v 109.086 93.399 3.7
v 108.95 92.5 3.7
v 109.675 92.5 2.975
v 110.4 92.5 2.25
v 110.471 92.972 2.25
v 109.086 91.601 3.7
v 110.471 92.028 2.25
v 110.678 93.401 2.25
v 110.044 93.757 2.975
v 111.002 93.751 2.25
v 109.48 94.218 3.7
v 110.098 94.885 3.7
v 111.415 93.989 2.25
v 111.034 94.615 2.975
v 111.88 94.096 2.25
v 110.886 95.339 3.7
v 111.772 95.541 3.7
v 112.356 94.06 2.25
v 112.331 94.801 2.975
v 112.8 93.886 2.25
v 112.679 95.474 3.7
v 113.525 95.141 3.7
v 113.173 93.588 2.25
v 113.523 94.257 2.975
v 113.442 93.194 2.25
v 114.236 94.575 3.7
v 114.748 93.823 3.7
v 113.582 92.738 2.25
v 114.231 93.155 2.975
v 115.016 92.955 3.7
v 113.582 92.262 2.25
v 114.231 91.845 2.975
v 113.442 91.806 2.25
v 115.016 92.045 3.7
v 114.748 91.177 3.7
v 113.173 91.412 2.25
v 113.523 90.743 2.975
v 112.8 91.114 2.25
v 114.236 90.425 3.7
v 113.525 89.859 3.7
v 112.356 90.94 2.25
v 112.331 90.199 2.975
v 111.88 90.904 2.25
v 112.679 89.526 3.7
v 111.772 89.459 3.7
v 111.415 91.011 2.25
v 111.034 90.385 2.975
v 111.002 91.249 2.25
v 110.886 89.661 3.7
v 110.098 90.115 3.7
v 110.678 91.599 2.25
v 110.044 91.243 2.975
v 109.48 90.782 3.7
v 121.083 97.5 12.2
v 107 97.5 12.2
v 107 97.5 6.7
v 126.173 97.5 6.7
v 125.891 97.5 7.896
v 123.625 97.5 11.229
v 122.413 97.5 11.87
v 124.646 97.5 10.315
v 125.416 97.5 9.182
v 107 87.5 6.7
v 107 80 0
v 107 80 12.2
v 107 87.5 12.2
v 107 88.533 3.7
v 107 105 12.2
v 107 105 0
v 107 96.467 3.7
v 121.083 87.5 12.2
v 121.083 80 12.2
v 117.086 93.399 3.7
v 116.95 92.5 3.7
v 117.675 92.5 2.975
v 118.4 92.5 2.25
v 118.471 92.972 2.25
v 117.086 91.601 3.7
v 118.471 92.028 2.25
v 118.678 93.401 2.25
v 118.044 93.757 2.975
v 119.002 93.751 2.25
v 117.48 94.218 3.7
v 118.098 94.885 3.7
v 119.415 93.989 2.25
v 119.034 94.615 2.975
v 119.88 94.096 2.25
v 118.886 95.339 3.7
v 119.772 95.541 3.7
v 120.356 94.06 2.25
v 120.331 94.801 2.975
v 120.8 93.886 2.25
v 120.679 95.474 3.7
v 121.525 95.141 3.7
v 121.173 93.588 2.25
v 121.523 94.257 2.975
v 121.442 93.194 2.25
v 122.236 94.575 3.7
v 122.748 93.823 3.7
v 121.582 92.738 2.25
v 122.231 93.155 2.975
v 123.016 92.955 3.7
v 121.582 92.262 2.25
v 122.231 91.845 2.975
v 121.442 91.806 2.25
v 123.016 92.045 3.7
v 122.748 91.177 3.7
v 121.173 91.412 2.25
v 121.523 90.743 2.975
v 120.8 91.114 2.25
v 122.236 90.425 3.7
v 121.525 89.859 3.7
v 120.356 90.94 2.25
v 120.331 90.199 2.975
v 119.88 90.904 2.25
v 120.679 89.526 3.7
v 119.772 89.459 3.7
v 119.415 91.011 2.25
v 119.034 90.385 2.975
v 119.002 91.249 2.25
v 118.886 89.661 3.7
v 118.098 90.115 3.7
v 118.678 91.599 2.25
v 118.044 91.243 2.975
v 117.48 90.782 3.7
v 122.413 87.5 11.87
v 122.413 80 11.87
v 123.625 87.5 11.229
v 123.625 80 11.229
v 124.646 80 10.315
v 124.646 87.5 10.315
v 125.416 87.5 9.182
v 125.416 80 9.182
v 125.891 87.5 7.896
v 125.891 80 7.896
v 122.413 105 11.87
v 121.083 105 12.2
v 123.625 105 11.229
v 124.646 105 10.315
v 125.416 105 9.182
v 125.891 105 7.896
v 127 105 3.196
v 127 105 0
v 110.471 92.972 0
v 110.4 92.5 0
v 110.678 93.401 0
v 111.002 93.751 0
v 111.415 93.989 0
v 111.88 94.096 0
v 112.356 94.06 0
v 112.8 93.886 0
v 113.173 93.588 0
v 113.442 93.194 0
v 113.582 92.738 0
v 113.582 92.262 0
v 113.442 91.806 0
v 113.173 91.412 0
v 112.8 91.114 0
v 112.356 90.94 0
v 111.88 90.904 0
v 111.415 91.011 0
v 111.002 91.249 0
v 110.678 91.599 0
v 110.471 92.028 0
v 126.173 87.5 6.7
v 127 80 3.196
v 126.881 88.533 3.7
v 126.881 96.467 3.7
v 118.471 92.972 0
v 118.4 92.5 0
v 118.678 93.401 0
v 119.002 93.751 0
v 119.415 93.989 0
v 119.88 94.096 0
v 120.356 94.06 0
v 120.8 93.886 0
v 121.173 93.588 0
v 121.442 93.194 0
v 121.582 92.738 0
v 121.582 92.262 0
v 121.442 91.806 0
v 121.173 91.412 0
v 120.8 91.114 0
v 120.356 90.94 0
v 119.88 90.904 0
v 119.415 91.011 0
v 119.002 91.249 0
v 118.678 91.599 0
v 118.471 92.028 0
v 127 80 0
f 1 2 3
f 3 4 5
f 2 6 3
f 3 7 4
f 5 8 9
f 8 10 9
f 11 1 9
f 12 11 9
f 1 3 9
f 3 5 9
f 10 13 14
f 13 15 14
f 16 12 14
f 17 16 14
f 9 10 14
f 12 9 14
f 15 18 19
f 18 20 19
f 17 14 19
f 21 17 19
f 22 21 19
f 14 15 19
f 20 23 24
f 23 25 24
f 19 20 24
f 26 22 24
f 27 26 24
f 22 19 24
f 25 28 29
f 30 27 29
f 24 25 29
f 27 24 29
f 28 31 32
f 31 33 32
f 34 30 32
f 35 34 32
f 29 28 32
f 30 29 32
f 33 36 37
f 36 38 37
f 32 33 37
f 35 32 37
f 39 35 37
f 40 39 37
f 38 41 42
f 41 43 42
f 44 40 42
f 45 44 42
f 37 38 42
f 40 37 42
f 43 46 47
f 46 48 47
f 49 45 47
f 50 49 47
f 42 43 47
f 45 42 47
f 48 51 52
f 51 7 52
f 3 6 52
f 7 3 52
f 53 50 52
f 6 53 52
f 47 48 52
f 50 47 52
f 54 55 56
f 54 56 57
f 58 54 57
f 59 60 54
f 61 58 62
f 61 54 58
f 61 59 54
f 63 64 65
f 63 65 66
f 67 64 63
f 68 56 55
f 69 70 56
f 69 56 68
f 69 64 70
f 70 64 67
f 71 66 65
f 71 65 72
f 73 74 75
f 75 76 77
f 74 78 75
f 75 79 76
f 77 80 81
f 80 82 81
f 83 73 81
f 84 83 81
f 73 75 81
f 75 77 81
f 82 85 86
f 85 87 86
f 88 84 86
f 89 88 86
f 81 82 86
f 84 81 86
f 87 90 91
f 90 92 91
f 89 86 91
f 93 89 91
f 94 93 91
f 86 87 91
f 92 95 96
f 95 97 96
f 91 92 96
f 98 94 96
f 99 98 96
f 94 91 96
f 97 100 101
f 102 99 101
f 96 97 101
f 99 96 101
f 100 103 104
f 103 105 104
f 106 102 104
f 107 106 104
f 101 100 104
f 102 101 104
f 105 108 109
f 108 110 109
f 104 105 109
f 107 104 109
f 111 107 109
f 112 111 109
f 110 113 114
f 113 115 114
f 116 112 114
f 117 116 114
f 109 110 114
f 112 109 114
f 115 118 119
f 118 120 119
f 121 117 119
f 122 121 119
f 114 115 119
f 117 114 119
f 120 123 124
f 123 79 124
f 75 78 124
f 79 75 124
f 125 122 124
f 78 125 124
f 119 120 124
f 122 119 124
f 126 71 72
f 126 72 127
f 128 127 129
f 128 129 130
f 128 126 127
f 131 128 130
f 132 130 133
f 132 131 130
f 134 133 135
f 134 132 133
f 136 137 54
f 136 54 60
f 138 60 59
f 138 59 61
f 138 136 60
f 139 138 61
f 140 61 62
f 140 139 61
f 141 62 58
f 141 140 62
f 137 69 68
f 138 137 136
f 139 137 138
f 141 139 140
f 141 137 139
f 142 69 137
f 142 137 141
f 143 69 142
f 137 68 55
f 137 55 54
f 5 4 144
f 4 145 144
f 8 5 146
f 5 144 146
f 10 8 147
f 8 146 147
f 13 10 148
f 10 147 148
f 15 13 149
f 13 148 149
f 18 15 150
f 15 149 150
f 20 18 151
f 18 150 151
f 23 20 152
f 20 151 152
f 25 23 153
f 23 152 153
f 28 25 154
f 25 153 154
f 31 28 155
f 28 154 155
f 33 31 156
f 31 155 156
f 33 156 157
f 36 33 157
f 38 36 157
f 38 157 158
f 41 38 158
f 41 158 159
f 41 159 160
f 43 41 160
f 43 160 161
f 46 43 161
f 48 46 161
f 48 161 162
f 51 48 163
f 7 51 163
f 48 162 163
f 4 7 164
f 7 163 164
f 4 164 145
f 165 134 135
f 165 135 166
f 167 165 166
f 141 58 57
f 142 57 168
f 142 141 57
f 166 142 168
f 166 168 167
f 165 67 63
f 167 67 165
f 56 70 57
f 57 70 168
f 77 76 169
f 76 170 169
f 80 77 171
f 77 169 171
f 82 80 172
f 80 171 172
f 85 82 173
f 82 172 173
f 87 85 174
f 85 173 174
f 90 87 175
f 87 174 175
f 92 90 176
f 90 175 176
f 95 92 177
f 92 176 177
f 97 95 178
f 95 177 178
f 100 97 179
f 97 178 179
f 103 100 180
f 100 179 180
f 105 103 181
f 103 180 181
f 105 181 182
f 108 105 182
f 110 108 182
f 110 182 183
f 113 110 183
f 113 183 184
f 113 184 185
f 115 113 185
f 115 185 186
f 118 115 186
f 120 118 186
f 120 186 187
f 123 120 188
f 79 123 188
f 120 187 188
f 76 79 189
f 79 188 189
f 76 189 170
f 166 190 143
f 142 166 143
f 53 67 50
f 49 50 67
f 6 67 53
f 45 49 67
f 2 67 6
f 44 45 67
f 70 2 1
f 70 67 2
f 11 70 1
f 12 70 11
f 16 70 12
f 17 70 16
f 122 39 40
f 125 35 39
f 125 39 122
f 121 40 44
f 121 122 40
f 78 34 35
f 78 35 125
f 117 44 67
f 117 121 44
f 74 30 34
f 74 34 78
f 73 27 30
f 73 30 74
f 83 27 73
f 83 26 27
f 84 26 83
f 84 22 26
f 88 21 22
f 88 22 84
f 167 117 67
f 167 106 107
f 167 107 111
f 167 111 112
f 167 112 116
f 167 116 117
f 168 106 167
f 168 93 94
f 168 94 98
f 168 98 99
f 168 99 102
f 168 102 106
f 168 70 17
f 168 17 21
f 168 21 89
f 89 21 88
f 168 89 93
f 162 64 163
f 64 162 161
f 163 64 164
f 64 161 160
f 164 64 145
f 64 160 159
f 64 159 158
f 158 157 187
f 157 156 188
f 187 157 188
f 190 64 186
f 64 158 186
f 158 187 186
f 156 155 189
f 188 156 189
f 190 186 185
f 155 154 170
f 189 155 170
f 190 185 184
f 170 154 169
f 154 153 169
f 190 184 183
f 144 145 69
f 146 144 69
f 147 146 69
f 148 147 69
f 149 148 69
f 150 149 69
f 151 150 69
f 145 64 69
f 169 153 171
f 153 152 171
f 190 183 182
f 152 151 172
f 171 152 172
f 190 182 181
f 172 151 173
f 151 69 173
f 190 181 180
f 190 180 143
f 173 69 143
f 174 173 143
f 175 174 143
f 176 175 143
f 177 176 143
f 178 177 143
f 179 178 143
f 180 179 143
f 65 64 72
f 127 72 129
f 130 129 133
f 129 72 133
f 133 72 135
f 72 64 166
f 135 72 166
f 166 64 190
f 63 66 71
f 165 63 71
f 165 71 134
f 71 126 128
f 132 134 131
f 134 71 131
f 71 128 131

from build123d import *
from OCP.BRepFilletAPI import BRepFilletAPI_MakeChamfer

# Parameters (mm, degrees)
SKETCH_1_W                = 20
SKETCH_1_H                = 25
EXTRUDE_1_DEPTH           = 12.2
CUT_EXTRUDE_1_DEPTH       = 26.5
SKETCH_3_W                = 20
SKETCH_3_H                = 10
CUT_EXTRUDE_2_DEPTH       = 8.5
HOLE_WIZARD_1_D           = 3.2
HOLE_WIZARD_1_CSINK_D     = 6.1
HOLE_WIZARD_1_CSINK_ANGLE = 90
CHAMFER_1_SIZE            = 3
CHAMFER_1_SIZE2           = 1.03298284


with BuildPart() as part:
    # 草图1 → 凸台-拉伸1 (new body)
    with BuildSketch(Plane.XY):
        with Locations((117, 92.5)):
            Rectangle(SKETCH_1_W, SKETCH_1_H)
    extrude(amount=EXTRUDE_1_DEPTH)

    # 草图2 → 切除-拉伸1 (cut)
    with BuildSketch(Plane(origin=(0, 105, 0), x_dir=(1, 0, 0), z_dir=(0, 1, 0))):
        with BuildLine():
            Line((125.890619014, -7.895997518), (127, -3.195997518))
            Line((127, -3.195997518), (127, -12.2))
            Line((127, -12.2), (121.083012976, -12.2))
            ThreePointArc((121.083012976, -12.2), (124.162916731, -10.803208822), (125.890619014, -7.895997518))
        make_face()
    extrude(amount=-CUT_EXTRUDE_1_DEPTH, mode=Mode.SUBTRACT)

    # 草图3 → 切除-拉伸2 (cut)
    with BuildSketch(Plane.XY.offset(12.2)):
        with Locations((117, 92.5)):
            Rectangle(SKETCH_3_W, SKETCH_3_H)
    extrude(amount=-CUT_EXTRUDE_2_DEPTH, mode=Mode.SUBTRACT)

    # 打孔尺寸(%根据)内六角花形半沉头螺钉的类型1 (through all)
    with Locations(Plane.XY.offset(3.7)):
        with Locations((112, 92.5), (120, 92.5)):
            CounterSinkHole(HOLE_WIZARD_1_D / 2, HOLE_WIZARD_1_CSINK_D / 2, counter_sink_angle=HOLE_WIZARD_1_CSINK_ANGLE)

    # 倒角1: one chamfer whose edges measure the first distance from different faces: ONE call of the kernel's chamfer builder (chamfer() names one face for all edges)
    chamfer_1_edges_1 = [part.edges().sort_by_distance(p)[0] for p in [
        (116.940518003, 87.5, 3.7),
    ]]
    chamfer_1_side_1 = [part.faces().sort_by_distance(p)[0] for p in [
        (116.264670273, 87.5, 7.794514486),
    ]]
    chamfer_1_edges_2 = [part.edges().sort_by_distance(p)[0] for p in [
        (116.940518003, 97.5, 3.7),
    ]]
    chamfer_1_side_2 = [part.faces().sort_by_distance(p)[0] for p in [
        (116.264670273, 97.5, 7.794514486),
    ]]
    chamfer_1 = BRepFilletAPI_MakeChamfer(part.part.solid().wrapped)
    for e in chamfer_1_edges_1:
        chamfer_1.Add(CHAMFER_1_SIZE, CHAMFER_1_SIZE2, e.wrapped, chamfer_1_side_1[0].wrapped)  # the first distance lies on this face
    for e in chamfer_1_edges_2:
        chamfer_1.Add(CHAMFER_1_SIZE, CHAMFER_1_SIZE2, e.wrapped, chamfer_1_side_2[0].wrapped)  # the first distance lies on this face
    add(Compound.cast(chamfer_1.Shape()), mode=Mode.REPLACE)


solid = part.part
